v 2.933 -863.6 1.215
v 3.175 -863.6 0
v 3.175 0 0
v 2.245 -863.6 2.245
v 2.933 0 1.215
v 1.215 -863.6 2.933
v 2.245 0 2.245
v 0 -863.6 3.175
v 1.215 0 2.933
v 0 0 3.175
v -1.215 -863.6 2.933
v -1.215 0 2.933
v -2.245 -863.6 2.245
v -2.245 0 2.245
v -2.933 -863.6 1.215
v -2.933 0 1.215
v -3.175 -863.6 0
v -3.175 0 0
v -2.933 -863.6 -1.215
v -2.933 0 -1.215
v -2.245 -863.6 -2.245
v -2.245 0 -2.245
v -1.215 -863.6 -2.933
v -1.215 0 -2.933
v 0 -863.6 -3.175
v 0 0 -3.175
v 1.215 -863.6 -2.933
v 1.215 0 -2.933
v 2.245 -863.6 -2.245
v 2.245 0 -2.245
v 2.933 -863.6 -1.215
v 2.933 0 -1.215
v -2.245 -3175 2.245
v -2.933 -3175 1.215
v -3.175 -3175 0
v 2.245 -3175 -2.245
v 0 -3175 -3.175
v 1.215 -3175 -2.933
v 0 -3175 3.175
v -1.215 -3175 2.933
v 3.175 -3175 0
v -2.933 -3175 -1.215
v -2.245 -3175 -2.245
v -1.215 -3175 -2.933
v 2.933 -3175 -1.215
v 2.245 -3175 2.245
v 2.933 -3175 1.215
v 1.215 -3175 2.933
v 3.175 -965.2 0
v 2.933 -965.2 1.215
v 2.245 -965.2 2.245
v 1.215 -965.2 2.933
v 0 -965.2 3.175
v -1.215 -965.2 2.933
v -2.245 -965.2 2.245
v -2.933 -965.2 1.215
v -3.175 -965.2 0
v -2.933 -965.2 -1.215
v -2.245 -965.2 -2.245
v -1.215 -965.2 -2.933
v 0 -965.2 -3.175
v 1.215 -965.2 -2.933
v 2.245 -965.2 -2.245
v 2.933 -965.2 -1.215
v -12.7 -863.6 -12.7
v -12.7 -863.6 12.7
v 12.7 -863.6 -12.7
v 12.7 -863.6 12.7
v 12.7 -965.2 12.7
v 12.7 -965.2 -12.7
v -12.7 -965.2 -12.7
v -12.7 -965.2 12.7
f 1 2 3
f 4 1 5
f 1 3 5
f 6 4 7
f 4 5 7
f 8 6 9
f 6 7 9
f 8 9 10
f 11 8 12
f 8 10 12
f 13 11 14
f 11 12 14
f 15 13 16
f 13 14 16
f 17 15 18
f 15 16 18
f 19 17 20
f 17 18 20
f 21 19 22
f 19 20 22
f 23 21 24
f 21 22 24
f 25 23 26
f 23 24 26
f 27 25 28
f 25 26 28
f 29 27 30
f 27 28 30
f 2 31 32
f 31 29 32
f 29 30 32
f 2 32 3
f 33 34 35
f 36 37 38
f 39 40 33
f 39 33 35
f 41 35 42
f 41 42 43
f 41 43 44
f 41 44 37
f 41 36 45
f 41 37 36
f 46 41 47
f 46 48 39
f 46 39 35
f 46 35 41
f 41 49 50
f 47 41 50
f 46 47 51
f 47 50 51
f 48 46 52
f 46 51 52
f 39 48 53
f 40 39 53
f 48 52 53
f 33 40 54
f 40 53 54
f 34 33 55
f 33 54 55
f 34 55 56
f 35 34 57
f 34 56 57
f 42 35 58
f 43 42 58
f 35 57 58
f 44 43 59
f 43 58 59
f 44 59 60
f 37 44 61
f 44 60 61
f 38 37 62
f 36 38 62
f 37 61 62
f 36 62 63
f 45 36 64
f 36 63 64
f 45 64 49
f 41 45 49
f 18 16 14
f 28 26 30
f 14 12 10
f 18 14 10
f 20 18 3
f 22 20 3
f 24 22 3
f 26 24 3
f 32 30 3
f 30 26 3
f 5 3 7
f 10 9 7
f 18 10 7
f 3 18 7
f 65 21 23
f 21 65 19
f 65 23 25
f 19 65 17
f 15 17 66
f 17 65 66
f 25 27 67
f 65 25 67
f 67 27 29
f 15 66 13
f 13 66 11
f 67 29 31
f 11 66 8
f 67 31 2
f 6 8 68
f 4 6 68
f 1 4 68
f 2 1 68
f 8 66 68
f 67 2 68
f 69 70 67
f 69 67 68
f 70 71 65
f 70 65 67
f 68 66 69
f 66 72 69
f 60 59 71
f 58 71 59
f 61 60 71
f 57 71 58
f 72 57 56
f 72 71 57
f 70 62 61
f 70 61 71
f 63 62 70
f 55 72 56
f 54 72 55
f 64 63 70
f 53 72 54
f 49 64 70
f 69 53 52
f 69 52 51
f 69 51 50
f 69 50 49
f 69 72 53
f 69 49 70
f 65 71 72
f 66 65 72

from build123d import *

# Parameters (mm, degrees)
F0_R          = 3.175
F1_DEPTH      = 3175
F3_W          = 25.4
F3_H          = 25.4
F4_DEPTH      = 50.8
F4_DEPTH_BACK = 50.8


with BuildPart() as f1:
    # F0 (on Front) → F1 (new body)
    with BuildSketch(Plane.XZ):
        Circle(F0_R)
    extrude(amount=F1_DEPTH)

    # F3 (on offset) → F4 (join, two sides)
    with BuildSketch(Plane.XZ.offset(914.4)) as f4_sk:
        Rectangle(F3_W, F3_H)
    extrude(amount=F4_DEPTH)
    extrude(f4_sk.sketch, amount=-F4_DEPTH_BACK)


solid = f1.part
